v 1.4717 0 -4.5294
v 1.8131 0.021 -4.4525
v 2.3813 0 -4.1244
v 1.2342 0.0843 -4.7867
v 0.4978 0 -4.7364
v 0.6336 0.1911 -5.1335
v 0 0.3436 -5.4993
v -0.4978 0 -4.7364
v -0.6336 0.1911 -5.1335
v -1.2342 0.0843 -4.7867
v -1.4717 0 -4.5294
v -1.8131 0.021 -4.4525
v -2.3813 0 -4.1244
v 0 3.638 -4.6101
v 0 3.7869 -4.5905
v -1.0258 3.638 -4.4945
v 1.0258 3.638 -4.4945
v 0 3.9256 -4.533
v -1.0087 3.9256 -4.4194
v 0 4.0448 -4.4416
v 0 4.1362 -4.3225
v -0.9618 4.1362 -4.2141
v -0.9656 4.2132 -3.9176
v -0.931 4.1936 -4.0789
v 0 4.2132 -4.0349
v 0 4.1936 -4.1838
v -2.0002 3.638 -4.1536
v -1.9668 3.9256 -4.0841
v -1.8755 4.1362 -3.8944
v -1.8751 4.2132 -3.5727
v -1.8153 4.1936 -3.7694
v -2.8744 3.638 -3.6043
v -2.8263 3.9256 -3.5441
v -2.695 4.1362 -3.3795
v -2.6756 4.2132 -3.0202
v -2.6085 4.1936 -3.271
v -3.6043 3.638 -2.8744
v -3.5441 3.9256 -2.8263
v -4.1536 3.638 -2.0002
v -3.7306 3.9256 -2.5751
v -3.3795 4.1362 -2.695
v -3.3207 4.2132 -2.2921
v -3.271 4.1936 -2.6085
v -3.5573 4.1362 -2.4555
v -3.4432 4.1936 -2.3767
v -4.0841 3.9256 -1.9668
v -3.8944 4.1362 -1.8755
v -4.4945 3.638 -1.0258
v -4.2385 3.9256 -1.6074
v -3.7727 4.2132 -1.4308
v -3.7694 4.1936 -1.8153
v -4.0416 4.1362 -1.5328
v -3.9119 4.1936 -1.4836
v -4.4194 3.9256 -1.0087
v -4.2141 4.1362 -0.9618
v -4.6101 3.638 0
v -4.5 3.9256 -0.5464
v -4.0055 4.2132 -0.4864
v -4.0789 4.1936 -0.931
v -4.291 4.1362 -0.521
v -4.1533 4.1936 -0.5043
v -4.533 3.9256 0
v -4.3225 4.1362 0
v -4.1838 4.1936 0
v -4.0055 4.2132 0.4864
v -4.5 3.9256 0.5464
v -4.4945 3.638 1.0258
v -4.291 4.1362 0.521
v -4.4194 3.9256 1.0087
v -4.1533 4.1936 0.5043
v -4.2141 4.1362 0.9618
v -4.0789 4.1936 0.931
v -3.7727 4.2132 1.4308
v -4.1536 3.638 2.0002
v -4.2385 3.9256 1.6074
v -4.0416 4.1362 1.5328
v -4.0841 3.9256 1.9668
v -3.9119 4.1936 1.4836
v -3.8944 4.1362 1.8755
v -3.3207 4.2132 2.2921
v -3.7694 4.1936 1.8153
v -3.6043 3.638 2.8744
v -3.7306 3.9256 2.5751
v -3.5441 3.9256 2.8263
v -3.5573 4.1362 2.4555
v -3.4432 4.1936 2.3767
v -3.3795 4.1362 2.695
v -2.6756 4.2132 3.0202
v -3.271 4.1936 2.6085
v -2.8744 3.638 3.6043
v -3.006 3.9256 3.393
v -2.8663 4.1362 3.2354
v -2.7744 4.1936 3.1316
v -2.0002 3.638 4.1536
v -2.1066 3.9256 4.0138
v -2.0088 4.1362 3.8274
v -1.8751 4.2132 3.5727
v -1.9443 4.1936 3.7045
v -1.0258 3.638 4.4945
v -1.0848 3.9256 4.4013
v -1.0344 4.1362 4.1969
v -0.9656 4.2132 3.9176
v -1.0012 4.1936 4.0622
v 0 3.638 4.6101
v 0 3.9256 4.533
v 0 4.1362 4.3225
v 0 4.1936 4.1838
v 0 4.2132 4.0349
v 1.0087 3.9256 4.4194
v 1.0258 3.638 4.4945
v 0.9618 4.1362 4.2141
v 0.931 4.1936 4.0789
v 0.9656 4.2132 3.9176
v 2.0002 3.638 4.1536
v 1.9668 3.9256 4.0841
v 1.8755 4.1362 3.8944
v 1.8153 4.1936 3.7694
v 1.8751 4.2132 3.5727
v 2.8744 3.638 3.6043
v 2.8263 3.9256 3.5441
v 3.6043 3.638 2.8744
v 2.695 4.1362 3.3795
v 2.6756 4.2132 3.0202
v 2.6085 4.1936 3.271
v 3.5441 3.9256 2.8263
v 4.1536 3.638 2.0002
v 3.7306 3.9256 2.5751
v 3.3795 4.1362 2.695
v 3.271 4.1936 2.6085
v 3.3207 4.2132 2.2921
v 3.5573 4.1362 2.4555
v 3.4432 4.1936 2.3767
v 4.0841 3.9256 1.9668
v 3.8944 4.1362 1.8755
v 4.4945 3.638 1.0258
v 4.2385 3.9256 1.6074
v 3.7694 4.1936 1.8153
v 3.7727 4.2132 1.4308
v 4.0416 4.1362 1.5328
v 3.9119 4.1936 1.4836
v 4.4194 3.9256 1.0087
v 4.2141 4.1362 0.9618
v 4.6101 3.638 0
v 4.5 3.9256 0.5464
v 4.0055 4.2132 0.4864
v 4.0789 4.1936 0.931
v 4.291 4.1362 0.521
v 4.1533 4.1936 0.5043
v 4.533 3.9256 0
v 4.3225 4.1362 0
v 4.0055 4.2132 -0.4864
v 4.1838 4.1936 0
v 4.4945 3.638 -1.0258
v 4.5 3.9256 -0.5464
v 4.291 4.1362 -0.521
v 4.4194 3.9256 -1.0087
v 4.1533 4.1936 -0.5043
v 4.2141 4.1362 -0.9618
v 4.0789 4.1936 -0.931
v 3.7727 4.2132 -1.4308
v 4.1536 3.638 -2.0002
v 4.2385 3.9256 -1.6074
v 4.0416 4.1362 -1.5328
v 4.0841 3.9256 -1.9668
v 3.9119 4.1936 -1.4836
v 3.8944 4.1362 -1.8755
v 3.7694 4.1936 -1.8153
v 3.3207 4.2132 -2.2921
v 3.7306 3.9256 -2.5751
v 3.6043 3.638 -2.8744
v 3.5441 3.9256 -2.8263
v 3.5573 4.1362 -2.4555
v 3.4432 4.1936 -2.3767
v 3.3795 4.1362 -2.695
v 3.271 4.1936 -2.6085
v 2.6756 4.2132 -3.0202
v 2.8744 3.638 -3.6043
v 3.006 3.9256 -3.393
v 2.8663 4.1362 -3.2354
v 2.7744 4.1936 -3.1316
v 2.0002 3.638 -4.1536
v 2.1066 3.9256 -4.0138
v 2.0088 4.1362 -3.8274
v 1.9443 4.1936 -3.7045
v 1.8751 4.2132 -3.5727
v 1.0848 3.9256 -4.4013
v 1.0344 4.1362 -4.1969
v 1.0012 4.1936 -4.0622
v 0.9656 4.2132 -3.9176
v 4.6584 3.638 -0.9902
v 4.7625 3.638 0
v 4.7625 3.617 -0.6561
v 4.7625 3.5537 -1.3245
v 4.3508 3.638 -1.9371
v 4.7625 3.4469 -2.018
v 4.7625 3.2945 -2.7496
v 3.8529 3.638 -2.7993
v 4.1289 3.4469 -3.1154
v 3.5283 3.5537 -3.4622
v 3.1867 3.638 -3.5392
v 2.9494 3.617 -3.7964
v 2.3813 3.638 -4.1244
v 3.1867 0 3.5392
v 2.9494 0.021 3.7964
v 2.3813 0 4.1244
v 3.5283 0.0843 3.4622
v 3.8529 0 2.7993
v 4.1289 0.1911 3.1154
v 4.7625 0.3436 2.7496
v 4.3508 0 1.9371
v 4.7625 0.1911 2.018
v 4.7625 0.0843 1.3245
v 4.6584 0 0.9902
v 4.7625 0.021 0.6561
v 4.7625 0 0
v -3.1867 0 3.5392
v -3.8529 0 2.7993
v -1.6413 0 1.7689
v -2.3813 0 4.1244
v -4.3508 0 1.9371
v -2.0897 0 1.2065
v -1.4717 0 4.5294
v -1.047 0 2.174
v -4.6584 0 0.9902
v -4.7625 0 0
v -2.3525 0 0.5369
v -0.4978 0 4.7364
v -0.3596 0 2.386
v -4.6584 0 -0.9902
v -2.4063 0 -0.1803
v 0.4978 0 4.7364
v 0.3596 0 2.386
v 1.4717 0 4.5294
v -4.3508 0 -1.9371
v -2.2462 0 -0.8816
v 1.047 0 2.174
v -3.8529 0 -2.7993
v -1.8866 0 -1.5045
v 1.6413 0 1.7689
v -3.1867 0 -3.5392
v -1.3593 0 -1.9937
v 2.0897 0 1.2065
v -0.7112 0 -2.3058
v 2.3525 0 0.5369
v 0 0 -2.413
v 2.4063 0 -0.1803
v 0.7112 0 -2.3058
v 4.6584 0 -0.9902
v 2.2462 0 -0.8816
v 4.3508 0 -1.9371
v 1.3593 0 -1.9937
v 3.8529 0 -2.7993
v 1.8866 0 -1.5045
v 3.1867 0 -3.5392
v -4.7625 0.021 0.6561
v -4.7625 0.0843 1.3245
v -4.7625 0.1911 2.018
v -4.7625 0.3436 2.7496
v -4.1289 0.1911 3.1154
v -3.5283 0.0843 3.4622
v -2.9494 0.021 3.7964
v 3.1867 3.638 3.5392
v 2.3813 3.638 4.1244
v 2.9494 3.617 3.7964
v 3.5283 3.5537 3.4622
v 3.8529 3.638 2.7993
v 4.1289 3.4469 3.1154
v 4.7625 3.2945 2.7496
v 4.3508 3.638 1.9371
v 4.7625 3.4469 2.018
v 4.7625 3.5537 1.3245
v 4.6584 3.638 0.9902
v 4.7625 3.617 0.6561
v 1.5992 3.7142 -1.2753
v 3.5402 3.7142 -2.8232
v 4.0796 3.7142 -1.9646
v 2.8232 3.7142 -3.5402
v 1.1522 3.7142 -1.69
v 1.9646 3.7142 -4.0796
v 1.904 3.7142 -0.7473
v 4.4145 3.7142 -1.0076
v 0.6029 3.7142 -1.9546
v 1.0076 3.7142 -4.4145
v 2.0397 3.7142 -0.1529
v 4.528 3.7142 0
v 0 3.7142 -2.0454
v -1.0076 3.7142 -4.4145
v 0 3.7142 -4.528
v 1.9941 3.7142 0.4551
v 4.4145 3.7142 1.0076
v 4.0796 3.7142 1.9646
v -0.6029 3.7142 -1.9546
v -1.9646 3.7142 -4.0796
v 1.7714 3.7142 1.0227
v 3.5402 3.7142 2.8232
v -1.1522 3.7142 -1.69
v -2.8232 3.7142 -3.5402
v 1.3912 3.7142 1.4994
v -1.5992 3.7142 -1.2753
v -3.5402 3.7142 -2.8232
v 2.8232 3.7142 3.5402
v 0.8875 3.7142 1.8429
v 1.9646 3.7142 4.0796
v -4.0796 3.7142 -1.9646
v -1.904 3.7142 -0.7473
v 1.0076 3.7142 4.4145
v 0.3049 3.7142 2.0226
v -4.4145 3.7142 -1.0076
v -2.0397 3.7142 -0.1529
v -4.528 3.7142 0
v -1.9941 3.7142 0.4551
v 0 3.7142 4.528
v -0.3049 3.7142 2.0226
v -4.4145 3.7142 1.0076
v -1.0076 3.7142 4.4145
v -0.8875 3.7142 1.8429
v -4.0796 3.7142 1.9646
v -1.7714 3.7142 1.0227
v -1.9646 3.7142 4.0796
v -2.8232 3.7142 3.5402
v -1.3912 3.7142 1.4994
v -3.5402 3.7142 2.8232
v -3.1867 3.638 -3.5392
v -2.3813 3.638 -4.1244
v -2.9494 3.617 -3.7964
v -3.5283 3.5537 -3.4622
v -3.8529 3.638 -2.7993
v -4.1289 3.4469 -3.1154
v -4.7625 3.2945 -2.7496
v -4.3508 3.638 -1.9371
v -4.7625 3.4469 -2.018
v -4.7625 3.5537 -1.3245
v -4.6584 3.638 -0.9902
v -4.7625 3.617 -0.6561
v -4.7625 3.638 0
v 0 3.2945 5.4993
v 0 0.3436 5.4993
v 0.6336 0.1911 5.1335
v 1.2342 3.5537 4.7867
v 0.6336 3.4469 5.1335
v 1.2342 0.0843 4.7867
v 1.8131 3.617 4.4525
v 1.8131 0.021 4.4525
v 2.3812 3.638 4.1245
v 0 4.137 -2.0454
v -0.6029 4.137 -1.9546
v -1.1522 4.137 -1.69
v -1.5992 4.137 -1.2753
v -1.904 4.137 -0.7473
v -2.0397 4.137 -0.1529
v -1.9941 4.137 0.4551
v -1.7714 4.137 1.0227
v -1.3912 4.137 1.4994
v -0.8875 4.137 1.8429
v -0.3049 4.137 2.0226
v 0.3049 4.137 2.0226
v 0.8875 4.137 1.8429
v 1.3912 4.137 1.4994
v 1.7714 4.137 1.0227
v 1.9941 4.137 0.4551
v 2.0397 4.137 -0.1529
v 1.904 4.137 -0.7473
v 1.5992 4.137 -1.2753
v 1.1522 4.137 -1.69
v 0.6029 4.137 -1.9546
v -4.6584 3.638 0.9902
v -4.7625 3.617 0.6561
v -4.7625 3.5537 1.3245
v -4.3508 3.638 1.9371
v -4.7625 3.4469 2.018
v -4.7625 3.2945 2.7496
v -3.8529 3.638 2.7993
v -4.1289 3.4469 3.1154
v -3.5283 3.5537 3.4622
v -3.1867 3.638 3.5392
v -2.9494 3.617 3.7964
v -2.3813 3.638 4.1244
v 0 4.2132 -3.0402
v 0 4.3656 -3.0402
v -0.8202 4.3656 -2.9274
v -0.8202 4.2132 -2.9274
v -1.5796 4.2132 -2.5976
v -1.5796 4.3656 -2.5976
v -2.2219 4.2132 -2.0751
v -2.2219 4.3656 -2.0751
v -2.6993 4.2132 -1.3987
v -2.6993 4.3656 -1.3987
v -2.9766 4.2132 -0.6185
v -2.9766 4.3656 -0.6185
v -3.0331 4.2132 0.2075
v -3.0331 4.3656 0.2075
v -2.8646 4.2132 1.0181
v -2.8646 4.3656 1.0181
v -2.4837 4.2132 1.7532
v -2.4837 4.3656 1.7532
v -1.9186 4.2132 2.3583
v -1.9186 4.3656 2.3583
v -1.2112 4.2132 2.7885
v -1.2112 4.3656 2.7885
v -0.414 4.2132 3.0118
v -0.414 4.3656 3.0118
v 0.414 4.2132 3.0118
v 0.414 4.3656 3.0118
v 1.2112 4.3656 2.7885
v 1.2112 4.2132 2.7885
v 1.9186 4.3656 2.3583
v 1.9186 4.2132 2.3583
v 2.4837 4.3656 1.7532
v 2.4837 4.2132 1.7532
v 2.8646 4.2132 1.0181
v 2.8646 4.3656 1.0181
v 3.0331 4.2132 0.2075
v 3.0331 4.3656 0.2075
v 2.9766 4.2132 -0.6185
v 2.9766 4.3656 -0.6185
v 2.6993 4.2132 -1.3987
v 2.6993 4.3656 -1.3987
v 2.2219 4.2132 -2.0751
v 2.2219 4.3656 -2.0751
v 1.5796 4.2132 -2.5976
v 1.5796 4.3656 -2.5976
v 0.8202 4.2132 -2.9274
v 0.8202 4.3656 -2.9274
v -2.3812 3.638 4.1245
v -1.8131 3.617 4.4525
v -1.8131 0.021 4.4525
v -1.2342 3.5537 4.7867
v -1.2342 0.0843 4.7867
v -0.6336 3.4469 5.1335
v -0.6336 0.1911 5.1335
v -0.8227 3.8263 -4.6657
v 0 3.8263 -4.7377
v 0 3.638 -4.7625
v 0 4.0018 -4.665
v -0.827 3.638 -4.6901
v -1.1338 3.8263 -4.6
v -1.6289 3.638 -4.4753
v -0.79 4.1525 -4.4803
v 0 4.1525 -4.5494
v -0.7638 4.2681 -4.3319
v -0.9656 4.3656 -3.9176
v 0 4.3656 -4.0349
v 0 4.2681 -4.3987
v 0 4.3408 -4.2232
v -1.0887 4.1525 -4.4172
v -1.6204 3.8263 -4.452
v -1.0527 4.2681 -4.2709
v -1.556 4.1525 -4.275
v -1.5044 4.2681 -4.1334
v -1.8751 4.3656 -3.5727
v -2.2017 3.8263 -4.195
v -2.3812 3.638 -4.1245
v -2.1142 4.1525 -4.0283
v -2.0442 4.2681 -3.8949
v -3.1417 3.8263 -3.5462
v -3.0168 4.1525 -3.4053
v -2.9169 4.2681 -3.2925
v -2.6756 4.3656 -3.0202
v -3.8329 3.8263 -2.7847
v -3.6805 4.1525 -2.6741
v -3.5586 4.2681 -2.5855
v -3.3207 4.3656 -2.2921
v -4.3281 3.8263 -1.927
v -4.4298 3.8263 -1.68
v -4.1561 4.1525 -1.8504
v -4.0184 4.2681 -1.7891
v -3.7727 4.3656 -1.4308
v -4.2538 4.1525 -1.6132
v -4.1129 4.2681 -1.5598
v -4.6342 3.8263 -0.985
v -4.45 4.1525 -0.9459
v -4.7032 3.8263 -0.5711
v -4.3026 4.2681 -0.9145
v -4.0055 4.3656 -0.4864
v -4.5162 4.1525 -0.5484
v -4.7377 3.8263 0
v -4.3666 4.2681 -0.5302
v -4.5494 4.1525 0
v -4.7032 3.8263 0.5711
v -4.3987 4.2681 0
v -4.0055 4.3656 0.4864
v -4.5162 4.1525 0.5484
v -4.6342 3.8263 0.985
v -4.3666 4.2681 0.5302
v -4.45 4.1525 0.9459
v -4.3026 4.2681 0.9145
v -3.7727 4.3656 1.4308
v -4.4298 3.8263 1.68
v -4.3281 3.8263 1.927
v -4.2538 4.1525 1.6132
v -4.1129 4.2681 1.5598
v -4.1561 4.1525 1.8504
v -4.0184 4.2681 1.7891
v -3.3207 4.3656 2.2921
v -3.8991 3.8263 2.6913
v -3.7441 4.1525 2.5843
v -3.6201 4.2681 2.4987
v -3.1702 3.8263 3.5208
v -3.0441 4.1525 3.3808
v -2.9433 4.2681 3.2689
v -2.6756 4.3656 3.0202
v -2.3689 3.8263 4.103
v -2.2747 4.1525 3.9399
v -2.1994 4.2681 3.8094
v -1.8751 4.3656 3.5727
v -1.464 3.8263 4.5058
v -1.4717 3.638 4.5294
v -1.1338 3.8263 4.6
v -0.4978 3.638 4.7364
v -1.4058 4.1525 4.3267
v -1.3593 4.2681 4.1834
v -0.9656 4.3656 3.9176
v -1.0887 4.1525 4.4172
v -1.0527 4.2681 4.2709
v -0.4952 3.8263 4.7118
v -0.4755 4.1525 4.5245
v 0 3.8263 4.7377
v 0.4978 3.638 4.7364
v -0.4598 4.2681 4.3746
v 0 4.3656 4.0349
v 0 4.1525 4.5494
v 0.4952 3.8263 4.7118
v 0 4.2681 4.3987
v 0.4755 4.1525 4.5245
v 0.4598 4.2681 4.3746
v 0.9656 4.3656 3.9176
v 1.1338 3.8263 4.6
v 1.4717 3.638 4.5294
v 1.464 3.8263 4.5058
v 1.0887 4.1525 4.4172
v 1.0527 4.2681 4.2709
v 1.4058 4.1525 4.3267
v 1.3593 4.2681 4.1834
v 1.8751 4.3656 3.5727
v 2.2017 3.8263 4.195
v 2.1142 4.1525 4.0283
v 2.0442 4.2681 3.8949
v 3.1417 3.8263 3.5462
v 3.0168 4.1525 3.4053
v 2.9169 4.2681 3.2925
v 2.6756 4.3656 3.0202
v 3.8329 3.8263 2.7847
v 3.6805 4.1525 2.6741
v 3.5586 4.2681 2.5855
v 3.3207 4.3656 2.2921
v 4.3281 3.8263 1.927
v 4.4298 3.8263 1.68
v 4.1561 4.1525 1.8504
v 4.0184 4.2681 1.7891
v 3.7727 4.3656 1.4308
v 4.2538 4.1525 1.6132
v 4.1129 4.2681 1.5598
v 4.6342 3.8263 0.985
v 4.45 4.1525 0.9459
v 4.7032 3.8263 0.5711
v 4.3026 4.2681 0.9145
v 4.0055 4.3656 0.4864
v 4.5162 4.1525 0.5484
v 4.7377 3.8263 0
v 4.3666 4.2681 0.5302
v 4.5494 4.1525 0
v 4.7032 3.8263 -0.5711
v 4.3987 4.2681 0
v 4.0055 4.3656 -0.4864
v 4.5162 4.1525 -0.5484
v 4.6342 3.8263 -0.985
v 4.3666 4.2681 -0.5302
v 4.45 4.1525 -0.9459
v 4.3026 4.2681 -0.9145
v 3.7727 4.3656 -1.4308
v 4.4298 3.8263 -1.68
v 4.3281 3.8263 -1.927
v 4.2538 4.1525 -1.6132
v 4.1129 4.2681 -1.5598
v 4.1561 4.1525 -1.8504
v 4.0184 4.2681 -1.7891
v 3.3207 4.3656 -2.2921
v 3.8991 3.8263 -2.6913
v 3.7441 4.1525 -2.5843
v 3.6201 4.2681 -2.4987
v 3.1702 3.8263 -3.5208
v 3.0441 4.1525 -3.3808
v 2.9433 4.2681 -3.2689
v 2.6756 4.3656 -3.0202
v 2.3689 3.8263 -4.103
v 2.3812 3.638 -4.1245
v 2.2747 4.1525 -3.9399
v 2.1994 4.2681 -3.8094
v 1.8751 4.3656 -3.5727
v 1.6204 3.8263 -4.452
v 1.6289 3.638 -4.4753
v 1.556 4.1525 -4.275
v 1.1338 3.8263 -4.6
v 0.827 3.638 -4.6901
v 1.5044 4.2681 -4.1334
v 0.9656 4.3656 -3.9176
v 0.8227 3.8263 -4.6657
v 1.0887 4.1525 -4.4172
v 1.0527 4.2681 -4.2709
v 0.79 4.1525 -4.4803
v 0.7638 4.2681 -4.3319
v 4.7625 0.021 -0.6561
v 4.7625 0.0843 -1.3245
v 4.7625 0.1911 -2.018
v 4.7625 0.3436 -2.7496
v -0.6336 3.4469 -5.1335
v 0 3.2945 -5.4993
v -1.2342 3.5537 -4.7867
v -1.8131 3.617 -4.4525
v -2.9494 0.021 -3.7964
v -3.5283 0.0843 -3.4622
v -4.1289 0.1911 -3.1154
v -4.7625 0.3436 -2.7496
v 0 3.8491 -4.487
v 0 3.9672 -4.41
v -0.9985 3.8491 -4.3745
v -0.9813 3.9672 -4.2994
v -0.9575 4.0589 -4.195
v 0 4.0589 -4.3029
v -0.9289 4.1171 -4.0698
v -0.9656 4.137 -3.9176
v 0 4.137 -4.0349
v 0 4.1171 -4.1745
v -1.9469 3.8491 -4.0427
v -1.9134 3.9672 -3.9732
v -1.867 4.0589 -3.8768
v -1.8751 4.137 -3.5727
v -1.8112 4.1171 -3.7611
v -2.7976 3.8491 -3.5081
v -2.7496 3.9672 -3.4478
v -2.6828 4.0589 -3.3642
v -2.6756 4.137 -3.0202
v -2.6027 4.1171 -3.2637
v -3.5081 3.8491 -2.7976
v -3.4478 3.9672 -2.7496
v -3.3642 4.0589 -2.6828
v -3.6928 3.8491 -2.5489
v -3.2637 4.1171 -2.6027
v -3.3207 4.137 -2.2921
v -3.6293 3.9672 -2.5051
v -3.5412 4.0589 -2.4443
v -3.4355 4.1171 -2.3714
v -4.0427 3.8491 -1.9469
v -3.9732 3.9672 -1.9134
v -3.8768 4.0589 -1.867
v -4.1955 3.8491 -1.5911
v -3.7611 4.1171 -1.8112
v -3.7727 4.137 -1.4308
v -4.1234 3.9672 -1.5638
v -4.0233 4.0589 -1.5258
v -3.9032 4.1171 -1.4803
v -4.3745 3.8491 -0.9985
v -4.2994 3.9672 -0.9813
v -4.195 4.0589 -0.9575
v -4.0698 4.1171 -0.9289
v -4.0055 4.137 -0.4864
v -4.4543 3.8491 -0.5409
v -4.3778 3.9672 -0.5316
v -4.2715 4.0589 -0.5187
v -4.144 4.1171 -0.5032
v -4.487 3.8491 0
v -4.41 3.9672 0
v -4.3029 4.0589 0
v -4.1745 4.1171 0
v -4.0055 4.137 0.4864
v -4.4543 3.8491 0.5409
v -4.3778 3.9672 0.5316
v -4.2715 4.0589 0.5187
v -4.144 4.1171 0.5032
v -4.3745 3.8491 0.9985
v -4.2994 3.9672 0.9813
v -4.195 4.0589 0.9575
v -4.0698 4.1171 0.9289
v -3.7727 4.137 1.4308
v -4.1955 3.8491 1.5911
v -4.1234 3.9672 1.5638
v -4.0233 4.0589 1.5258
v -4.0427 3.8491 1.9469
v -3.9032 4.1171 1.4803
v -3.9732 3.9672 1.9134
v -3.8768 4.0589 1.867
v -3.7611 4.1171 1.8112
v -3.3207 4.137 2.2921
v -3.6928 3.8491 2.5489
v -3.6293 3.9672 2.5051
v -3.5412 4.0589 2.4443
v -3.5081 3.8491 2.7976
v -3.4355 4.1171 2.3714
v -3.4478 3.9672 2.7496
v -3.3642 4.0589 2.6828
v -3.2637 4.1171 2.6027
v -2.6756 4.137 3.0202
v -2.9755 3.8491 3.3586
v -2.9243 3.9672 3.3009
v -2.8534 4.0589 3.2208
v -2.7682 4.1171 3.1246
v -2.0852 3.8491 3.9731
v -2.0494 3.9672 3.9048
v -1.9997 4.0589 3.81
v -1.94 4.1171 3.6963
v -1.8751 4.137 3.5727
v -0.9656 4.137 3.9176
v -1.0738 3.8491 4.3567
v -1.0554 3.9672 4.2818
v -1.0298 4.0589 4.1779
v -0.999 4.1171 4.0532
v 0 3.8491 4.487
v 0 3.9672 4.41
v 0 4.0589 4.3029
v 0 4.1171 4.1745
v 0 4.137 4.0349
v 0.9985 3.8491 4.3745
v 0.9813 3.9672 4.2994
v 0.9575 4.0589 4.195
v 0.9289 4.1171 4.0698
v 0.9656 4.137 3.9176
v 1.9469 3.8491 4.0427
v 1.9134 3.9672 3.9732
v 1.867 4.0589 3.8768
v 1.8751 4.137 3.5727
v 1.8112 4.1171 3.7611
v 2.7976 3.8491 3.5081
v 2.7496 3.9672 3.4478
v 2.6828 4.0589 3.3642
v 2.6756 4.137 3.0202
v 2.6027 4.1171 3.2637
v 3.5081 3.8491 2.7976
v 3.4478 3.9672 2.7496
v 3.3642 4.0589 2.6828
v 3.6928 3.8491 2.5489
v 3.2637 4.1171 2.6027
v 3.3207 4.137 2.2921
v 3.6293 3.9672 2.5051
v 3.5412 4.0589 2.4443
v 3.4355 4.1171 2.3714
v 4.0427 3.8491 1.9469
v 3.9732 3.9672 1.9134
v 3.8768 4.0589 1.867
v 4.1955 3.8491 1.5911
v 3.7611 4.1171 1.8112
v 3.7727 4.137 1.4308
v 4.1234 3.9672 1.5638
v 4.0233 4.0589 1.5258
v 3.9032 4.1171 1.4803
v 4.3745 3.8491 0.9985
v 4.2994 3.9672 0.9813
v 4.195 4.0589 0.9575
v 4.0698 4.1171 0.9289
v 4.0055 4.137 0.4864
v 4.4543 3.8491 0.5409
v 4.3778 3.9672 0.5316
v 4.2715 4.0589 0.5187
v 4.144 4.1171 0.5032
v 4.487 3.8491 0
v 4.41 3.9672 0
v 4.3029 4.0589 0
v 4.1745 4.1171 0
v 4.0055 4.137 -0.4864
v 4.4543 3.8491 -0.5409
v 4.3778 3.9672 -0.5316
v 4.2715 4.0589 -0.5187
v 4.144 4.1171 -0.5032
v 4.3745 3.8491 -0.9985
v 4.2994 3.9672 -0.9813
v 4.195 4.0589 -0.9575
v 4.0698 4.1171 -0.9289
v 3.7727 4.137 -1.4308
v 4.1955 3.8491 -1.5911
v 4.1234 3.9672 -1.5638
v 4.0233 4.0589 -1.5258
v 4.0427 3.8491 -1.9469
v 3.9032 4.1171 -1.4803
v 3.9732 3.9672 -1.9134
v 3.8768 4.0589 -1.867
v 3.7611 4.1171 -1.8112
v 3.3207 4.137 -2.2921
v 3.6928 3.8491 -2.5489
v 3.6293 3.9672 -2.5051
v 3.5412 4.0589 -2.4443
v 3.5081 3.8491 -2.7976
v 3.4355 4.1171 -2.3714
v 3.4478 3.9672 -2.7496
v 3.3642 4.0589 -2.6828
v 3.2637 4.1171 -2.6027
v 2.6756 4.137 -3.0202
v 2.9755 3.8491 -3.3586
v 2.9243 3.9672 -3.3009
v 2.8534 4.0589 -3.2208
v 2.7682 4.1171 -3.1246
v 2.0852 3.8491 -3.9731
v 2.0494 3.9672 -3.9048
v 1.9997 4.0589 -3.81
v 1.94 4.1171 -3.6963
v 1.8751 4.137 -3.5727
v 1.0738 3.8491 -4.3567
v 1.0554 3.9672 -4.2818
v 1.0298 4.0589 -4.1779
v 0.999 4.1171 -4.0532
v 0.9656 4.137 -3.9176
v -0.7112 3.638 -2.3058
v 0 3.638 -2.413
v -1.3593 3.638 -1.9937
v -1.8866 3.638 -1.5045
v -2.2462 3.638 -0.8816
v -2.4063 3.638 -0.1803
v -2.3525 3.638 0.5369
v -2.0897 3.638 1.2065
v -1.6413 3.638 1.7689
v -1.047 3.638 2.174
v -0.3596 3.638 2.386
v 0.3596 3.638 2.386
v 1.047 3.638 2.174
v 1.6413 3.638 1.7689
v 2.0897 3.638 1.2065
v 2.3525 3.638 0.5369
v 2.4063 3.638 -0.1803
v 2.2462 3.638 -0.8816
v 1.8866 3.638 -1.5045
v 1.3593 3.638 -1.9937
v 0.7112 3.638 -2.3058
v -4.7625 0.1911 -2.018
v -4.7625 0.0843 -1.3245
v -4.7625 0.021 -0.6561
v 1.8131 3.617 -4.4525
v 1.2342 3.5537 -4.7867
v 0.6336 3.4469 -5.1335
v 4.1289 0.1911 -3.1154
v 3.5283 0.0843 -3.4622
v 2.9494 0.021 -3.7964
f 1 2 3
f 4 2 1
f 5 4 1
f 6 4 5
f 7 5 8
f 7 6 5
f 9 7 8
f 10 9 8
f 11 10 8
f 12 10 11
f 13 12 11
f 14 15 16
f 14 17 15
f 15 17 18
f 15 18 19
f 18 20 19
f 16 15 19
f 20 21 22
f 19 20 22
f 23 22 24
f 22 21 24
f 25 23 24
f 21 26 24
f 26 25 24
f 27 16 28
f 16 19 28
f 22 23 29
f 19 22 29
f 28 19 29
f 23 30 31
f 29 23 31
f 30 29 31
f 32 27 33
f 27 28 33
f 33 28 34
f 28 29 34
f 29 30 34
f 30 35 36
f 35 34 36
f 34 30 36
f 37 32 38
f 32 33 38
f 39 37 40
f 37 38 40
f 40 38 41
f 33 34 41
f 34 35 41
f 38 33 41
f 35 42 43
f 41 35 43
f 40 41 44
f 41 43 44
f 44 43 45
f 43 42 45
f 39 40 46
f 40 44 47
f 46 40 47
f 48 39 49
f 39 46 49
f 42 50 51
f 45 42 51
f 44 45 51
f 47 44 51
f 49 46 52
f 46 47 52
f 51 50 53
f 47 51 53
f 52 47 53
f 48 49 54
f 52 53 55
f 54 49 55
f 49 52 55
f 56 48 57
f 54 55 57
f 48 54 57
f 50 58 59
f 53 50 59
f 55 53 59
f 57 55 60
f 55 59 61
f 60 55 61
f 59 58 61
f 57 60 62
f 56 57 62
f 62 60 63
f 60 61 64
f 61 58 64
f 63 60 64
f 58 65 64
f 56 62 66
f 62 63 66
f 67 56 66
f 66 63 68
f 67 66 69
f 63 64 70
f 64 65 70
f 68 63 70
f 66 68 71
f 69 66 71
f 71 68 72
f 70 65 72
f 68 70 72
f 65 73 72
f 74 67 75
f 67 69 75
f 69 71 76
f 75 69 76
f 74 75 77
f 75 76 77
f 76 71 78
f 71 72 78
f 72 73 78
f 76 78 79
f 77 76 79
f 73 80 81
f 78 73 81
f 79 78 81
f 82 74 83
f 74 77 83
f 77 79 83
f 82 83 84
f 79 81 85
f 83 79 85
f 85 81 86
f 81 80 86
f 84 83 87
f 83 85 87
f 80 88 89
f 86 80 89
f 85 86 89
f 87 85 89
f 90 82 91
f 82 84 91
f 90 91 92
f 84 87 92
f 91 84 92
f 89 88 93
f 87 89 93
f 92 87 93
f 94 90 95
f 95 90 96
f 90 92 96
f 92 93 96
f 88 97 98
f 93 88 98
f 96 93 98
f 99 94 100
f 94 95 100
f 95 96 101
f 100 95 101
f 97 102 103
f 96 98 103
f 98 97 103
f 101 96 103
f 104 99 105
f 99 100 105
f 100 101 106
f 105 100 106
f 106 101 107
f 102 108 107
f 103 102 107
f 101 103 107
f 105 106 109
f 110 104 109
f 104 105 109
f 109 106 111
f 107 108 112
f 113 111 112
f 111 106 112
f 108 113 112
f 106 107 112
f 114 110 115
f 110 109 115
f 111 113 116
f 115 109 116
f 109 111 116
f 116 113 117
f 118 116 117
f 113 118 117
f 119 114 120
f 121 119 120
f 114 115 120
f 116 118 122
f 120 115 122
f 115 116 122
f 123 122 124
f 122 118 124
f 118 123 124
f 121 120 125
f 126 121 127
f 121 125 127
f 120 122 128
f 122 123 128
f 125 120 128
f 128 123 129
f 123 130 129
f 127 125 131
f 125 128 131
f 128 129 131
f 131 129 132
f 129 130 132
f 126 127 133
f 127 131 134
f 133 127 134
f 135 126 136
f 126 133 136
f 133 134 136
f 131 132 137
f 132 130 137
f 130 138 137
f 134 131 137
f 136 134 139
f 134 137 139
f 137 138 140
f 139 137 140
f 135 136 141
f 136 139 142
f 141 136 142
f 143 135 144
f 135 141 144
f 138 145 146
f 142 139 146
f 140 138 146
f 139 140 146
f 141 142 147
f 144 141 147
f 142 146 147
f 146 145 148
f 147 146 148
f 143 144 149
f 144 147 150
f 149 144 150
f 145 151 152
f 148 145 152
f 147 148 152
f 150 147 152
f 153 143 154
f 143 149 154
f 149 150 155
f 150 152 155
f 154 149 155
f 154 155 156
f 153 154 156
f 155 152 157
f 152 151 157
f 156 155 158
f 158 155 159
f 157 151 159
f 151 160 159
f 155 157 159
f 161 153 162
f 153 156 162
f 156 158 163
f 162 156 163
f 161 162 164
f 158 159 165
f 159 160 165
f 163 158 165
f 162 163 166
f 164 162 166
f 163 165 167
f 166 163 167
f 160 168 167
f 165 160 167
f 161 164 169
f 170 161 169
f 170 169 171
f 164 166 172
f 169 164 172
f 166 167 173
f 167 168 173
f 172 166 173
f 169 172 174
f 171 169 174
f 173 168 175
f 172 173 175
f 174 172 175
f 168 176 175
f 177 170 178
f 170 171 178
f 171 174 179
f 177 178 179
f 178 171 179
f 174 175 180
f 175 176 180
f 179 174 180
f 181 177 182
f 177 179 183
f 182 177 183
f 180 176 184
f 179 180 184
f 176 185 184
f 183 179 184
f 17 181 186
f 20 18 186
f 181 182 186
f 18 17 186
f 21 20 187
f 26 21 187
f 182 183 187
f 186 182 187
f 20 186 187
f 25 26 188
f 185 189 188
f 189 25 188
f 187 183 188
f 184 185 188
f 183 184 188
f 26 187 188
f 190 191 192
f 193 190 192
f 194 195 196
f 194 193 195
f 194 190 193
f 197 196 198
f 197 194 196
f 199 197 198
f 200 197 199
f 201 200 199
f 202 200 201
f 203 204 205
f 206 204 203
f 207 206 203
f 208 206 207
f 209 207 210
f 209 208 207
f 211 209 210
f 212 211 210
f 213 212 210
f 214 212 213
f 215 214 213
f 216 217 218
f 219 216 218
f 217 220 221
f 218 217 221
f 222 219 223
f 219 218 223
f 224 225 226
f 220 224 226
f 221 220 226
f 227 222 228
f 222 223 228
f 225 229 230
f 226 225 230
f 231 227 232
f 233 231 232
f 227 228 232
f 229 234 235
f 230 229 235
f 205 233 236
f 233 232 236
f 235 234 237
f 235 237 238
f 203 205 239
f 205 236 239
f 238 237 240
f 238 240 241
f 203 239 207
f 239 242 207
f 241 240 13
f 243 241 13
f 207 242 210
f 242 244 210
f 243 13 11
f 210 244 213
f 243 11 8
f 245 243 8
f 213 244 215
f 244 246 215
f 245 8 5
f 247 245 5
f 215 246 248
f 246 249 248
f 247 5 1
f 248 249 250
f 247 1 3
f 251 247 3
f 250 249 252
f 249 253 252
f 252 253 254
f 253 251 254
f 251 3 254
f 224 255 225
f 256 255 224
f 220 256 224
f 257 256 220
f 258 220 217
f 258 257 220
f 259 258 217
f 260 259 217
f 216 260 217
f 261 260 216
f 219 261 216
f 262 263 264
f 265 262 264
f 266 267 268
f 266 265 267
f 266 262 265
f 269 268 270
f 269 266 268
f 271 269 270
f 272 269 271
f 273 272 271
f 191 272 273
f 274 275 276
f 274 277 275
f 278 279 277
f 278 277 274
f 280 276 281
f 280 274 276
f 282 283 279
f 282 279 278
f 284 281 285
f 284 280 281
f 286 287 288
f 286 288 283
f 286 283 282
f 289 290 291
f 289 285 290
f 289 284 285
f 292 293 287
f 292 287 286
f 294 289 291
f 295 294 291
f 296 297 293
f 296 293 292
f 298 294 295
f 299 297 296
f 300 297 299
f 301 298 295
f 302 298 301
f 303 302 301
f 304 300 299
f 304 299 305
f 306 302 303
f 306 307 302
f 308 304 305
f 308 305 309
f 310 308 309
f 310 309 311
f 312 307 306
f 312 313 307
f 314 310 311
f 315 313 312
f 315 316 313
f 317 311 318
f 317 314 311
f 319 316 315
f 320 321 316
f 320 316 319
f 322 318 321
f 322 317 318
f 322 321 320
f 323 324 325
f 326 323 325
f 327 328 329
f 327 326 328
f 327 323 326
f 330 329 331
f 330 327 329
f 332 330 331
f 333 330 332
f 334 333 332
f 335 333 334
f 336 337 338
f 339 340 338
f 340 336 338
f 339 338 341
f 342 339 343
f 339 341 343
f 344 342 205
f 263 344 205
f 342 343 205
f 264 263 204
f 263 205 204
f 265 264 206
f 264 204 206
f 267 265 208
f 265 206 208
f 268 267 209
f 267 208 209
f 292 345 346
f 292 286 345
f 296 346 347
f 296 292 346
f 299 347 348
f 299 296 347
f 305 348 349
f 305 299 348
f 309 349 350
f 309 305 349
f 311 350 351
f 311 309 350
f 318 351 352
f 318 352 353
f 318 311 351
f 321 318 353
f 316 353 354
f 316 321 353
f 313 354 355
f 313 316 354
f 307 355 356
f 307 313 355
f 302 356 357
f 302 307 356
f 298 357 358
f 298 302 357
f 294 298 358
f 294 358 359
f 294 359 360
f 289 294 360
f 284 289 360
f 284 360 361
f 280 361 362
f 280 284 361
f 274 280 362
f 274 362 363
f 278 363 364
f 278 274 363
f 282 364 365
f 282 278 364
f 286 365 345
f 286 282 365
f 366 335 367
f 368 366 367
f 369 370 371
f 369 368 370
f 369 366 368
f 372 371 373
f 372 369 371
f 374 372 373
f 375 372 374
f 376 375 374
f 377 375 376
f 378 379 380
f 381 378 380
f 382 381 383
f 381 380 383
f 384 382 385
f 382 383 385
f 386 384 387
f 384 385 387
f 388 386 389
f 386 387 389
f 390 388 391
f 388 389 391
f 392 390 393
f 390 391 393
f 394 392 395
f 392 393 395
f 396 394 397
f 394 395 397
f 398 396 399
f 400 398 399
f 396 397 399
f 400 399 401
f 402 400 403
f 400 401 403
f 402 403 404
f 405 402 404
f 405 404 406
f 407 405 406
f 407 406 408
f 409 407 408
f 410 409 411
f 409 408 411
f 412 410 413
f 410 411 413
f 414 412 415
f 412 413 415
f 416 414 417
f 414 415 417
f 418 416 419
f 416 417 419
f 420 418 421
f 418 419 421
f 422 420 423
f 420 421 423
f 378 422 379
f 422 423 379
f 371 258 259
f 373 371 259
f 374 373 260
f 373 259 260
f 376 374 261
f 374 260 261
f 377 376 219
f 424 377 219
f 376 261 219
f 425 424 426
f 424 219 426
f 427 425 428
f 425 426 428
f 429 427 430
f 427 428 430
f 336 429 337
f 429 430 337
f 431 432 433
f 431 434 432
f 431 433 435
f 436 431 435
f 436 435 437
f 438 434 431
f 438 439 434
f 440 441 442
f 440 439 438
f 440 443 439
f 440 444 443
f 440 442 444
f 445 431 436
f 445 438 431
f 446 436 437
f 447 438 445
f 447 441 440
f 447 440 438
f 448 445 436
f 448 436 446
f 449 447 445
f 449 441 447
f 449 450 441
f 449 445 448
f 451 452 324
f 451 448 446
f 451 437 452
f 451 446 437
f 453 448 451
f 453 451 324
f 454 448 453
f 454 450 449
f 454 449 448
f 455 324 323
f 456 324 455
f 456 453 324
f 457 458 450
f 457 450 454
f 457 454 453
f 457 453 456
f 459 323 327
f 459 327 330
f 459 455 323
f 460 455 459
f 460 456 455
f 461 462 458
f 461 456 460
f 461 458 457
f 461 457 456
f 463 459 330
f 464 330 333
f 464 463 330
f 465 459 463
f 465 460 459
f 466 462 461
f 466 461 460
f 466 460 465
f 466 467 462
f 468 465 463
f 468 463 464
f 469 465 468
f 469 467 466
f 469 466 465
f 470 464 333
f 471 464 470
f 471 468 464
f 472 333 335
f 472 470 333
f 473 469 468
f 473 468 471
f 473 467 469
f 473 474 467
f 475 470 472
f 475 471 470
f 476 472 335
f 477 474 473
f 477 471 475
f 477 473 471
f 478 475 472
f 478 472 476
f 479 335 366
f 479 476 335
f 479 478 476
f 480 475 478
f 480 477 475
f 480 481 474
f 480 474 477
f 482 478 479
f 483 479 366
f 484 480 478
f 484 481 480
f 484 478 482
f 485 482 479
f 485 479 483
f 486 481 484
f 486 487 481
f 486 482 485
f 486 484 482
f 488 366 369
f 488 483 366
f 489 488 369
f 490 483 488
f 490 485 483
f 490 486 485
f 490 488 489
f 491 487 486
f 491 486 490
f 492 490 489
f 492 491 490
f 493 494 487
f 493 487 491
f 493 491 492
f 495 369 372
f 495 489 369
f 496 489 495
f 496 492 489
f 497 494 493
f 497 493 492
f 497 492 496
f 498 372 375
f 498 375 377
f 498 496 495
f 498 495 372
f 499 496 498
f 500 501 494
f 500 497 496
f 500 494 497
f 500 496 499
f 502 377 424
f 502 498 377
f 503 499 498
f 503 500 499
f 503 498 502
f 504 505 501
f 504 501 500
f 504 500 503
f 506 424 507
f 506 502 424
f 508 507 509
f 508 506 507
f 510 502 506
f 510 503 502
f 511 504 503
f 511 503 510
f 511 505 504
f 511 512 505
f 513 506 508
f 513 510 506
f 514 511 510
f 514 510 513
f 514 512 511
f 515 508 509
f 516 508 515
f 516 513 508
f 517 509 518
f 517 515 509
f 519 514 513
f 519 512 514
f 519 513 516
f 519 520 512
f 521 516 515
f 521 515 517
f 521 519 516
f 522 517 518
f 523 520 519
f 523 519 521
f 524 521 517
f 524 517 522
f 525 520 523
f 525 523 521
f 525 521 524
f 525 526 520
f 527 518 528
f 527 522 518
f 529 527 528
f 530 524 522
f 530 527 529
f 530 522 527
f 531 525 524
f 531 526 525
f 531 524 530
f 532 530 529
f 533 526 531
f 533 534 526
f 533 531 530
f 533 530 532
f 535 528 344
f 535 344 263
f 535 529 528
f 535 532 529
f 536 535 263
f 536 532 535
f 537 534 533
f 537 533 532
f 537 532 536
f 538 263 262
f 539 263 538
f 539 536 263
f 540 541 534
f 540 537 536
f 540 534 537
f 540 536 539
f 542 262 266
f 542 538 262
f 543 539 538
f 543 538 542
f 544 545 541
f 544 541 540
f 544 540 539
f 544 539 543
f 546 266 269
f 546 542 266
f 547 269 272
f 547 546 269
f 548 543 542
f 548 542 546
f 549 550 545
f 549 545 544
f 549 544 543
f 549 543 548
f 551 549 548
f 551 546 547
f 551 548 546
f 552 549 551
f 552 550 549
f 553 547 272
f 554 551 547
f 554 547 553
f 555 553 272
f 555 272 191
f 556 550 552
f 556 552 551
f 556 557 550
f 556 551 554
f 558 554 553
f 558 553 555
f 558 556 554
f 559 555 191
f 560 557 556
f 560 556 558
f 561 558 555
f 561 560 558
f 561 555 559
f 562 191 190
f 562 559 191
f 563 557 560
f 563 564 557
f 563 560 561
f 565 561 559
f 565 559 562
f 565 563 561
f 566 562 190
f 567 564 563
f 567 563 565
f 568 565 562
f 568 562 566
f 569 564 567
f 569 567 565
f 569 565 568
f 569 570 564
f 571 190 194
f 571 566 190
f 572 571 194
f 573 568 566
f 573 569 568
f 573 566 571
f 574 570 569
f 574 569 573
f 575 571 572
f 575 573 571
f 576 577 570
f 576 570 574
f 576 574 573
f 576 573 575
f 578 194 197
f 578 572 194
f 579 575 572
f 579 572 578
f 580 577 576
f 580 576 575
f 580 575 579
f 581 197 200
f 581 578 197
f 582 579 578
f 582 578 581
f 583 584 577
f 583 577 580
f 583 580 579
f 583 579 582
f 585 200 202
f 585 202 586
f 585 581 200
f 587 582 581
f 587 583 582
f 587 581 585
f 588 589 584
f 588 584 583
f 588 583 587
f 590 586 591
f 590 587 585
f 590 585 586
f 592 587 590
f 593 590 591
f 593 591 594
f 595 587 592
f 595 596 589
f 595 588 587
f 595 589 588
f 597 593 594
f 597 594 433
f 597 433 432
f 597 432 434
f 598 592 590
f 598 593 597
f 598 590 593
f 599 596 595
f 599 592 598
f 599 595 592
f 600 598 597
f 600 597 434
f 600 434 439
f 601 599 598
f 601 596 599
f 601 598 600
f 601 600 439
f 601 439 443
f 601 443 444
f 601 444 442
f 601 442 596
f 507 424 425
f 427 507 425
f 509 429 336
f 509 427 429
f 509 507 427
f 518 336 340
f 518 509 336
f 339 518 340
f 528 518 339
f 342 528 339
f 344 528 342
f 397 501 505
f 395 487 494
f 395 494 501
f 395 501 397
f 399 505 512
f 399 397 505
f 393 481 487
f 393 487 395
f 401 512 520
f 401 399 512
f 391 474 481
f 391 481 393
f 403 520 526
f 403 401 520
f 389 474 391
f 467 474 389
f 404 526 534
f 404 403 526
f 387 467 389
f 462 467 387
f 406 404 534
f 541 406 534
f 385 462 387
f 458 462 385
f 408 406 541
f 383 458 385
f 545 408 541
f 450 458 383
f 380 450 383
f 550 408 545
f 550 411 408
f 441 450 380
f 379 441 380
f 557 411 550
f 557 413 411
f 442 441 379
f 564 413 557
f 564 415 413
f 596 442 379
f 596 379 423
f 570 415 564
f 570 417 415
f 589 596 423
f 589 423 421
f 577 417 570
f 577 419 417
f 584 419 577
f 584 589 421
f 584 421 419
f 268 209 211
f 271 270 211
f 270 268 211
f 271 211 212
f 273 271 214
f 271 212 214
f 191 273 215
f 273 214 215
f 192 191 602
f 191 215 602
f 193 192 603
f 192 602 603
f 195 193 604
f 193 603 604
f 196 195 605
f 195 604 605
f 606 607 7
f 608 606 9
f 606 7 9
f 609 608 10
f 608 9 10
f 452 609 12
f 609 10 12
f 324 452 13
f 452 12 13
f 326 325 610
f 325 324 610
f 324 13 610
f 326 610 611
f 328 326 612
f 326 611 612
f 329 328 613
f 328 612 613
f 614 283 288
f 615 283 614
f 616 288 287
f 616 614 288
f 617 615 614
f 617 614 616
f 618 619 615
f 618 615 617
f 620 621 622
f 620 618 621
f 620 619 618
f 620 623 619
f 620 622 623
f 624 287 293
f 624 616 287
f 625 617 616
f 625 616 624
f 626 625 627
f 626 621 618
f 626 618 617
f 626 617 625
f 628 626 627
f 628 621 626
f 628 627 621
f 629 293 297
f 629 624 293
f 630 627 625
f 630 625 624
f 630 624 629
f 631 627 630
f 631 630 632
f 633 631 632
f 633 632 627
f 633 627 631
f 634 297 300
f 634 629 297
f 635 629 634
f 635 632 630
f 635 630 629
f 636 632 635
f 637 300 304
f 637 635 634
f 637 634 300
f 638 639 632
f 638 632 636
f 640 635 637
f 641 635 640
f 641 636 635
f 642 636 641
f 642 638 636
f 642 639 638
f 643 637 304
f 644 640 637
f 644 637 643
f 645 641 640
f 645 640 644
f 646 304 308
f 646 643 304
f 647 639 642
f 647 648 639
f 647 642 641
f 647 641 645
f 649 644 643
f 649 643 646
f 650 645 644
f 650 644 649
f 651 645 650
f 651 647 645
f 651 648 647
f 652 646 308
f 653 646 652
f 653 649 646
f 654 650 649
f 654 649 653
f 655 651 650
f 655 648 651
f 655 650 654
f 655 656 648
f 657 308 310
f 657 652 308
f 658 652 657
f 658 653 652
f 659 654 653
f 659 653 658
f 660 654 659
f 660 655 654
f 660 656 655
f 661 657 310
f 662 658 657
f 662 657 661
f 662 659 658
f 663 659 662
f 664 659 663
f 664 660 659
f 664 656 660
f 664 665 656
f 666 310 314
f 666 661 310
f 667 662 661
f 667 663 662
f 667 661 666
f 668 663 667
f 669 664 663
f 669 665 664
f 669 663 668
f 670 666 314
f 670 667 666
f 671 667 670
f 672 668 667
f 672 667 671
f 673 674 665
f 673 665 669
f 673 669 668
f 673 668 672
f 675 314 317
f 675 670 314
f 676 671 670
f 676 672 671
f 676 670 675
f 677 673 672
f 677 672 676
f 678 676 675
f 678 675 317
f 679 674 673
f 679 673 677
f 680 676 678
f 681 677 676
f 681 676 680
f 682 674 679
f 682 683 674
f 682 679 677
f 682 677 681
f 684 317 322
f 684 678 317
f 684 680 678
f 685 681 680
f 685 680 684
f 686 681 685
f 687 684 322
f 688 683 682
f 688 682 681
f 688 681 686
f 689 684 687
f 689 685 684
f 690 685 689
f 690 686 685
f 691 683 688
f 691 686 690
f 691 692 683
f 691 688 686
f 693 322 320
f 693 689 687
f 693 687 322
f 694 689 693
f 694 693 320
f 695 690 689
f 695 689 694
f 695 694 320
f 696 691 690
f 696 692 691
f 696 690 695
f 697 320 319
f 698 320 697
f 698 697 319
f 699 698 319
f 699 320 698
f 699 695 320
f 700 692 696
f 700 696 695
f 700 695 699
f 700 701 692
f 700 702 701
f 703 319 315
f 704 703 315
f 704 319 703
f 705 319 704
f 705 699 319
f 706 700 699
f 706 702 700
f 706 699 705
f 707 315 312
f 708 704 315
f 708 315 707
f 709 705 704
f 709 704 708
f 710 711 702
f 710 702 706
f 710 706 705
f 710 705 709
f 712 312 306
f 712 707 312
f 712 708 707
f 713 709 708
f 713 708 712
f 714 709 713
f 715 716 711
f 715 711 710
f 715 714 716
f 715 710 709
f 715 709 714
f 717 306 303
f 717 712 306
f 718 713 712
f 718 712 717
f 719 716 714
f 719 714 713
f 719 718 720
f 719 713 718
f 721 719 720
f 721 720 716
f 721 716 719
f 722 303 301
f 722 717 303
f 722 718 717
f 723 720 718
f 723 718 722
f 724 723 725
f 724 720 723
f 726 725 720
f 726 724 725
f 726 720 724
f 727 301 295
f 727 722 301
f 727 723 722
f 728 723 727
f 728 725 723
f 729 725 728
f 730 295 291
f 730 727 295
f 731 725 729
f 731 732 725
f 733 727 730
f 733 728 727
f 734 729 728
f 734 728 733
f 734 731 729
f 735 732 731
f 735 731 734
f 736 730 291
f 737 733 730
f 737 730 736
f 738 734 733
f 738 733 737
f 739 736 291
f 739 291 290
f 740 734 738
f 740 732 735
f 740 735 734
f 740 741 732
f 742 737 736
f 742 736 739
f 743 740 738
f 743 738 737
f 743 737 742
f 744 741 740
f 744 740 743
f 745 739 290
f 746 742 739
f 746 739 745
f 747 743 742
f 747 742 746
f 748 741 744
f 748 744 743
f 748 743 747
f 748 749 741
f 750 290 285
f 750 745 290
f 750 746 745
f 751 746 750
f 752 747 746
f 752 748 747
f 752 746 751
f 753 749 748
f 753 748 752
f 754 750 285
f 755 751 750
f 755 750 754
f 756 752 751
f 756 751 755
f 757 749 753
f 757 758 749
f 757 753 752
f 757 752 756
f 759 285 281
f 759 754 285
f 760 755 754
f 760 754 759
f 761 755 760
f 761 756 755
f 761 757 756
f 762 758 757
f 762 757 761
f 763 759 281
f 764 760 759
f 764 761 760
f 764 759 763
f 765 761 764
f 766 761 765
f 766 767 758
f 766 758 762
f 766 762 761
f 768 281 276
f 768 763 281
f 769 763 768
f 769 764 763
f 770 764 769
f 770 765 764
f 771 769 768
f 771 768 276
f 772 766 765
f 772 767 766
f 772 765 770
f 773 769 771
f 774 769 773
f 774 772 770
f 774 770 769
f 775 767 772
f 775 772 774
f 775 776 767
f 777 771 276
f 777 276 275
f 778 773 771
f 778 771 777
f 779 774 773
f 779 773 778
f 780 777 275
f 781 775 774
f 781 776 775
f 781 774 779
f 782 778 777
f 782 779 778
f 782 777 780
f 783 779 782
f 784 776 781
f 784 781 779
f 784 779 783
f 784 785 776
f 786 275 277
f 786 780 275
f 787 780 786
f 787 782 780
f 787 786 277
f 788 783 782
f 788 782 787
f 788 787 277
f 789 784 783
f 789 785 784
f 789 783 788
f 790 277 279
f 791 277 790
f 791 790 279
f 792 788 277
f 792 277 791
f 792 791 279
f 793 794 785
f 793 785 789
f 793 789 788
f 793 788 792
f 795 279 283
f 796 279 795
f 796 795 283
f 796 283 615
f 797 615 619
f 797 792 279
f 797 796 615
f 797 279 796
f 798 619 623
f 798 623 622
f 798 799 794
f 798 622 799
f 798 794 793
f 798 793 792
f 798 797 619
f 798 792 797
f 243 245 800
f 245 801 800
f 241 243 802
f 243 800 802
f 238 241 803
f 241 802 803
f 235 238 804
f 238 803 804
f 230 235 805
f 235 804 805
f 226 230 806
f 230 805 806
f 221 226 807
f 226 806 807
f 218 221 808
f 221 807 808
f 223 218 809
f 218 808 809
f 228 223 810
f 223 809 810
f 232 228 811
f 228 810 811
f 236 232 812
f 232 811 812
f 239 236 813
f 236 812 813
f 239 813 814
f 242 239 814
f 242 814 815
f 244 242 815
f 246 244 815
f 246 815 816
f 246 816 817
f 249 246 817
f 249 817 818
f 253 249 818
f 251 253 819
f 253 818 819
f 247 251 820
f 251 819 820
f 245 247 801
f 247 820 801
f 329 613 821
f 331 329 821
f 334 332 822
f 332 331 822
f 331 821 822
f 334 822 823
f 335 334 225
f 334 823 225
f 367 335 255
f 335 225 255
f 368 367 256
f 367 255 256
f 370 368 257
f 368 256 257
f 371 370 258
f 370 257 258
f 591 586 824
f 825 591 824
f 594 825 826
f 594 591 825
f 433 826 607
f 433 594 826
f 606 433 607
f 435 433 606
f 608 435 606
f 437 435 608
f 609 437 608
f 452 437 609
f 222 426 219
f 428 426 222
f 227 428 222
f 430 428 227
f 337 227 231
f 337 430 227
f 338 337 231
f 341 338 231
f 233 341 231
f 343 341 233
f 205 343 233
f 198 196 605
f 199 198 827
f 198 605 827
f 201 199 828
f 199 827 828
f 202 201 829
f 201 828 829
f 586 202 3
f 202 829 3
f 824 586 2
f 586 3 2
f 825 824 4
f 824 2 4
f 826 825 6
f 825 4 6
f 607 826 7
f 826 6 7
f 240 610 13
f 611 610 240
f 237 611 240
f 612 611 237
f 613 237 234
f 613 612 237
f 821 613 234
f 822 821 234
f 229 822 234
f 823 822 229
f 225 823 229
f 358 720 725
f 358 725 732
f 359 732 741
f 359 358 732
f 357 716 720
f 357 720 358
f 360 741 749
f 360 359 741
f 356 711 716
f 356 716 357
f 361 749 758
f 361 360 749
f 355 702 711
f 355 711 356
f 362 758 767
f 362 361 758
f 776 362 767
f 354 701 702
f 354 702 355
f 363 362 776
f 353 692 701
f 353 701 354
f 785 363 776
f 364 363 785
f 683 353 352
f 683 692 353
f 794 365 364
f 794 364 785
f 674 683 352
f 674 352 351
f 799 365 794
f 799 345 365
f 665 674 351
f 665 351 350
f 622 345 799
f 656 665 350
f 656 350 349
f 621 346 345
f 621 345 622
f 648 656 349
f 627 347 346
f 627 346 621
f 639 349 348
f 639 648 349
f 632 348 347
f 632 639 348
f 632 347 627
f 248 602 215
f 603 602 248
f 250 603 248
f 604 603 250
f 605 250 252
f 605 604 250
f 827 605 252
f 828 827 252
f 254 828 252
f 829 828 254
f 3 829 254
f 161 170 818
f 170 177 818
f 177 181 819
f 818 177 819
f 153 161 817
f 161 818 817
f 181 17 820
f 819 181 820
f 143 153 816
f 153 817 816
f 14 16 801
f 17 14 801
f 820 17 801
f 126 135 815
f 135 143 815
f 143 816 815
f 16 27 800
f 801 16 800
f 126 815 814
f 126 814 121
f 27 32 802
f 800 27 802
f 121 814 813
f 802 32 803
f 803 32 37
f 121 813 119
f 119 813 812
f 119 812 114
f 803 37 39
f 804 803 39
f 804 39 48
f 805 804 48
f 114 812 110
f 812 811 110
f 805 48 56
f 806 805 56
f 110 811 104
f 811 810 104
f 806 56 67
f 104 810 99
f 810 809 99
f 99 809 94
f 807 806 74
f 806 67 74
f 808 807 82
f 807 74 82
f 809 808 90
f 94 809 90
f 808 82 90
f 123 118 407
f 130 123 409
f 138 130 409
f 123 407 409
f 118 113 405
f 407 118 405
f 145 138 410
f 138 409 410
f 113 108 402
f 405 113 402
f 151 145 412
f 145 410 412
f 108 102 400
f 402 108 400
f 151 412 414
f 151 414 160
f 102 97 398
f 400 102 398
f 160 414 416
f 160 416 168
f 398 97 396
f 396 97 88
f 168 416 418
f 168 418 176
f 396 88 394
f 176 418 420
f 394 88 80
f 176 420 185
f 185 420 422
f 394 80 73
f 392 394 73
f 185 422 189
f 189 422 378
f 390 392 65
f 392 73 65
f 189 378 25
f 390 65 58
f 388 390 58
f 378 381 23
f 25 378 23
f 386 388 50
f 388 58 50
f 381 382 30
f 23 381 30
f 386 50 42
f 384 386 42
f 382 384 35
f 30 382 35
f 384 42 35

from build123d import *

# Parameters (mm, degrees)
EXTRUDE1_DEPTH = 4.365625
SKETCH2_W      = 2.413
SKETCH2_H      = 4.365625


with BuildPart() as part:
    # Sketch1 → Extrude1 (new body)
    with BuildSketch(Plane(origin=(0, 0, 0), x_dir=(1, 0, 0), z_dir=(0, 1, 0))):
        Polygon((0, 5.499261314), (-4.7625, 2.749630657), (-4.7625, -2.749630657), (0, -5.499261314), (4.7625, -2.749630657), (4.7625, 2.749630657), align=None)
    extrude(amount=EXTRUDE1_DEPTH)

    # Sketch4 → Cut-Revolve2 (revolve, cut)
    with BuildSketch(Plane(origin=(0, 0, 0), x_dir=(0, 0, -1), z_dir=(1, 0, 0))):
        Polygon((0, 4.365625), (2.413, 4.365625), (2.045424837, 4.194221887), (2.045424837, 0.171403113), (2.413, 0), (0, 0), align=None)
    revolve(axis=Axis((0, 4.365625, 0), (0, 1, 0)), mode=Mode.SUBTRACT)


with BuildPart() as body_2:
    # Sketch2 → Revolve1 (revolve)
    with BuildSketch(Plane(origin=(0, 0, 0), x_dir=(0, 0, -1), z_dir=(1, 0, 0))):
        with Locations((1.2065, 2.1828125)):
            Rectangle(SKETCH2_W, SKETCH2_H)
    revolve(axis=Axis((0, -2.413, 0), (0, 1, 0)))


with BuildPart() as part_1:
    add(part.part)

    # Combine1: cut body 2
    add(body_2.part, mode=Mode.SUBTRACT)

    # Sketch5 → Cut-Revolve3 (revolve, cut)
    with BuildSketch(Plane(origin=(0, 0, 0), x_dir=(0, 0, -1), z_dir=(1, 0, 0))):
        with BuildLine():
            Line((0, 0), (4.7625, 0))
            Line((4.7625, 0), (5.499261314, 0.343557443))
            Line((5.499261314, 0.343557443), (5.499261314, 3.29446339))
            Line((5.499261314, 3.29446339), (4.7625, 3.638020833))
            ThreePointArc((4.7625, 3.638020833), (4.549389674, 4.152514674), (4.034895833, 4.365625))
            Line((4.034895833, 4.365625), (4.034895833, 5.635625))
            Line((4.034895833, 5.635625), (6.769261314, 5.635625))
            Line((6.769261314, 5.635625), (6.769261314, -1.27))
            Line((6.769261314, -1.27), (0, -1.27))
            Line((0, -1.27), (0, 0))
        make_face()
    revolve(axis=Axis((0, 0, 0), (0, 1, 0)), mode=Mode.SUBTRACT)

    # Sketch6 → Cut-Revolve4 (revolve, cut)
    with BuildSketch(Plane(origin=(0, 0, 0), x_dir=(0, 0, -1), z_dir=(1, 0, 0))):
        with BuildLine():
            Line((0, 3.638020833), (4.6101, 3.638020833))
            ThreePointArc((4.6101, 3.638020833), (4.4416266, 4.0447516), (4.034895833, 4.213225))
            Line((4.034895833, 4.213225), (3.040160335, 4.213225))
            Line((3.040160335, 4.213225), (3.040160335, 5.635625))
            Line((3.040160335, 5.635625), (0, 5.635625))
            Line((0, 5.635625), (0, 3.638020833))
        make_face()
    revolve(axis=Axis((0, 5.635625, 0), (0, 1, 0)), mode=Mode.SUBTRACT)


with BuildPart() as body_2_2:
    # Sketch7 → Revolve2 (revolve)
    with BuildSketch(Plane(origin=(0, 0, 0), x_dir=(0, 0, -1), z_dir=(1, 0, 0))):
        with BuildLine():
            Line((2.045424837, 3.714220833), (4.528047654, 3.714220833))
            ThreePointArc((4.528047654, 3.714220833), (4.359688876, 4.016854092), (4.034895833, 4.137025))
            Line((4.034895833, 4.137025), (2.045424837, 4.137025))
            Line((2.045424837, 4.137025), (2.045424837, 3.714220833))
        make_face()
    revolve(axis=Axis((0, 3.714220833, 0), (0, 1, 0)))


solid = Compound([part_1.part, body_2_2.part])
